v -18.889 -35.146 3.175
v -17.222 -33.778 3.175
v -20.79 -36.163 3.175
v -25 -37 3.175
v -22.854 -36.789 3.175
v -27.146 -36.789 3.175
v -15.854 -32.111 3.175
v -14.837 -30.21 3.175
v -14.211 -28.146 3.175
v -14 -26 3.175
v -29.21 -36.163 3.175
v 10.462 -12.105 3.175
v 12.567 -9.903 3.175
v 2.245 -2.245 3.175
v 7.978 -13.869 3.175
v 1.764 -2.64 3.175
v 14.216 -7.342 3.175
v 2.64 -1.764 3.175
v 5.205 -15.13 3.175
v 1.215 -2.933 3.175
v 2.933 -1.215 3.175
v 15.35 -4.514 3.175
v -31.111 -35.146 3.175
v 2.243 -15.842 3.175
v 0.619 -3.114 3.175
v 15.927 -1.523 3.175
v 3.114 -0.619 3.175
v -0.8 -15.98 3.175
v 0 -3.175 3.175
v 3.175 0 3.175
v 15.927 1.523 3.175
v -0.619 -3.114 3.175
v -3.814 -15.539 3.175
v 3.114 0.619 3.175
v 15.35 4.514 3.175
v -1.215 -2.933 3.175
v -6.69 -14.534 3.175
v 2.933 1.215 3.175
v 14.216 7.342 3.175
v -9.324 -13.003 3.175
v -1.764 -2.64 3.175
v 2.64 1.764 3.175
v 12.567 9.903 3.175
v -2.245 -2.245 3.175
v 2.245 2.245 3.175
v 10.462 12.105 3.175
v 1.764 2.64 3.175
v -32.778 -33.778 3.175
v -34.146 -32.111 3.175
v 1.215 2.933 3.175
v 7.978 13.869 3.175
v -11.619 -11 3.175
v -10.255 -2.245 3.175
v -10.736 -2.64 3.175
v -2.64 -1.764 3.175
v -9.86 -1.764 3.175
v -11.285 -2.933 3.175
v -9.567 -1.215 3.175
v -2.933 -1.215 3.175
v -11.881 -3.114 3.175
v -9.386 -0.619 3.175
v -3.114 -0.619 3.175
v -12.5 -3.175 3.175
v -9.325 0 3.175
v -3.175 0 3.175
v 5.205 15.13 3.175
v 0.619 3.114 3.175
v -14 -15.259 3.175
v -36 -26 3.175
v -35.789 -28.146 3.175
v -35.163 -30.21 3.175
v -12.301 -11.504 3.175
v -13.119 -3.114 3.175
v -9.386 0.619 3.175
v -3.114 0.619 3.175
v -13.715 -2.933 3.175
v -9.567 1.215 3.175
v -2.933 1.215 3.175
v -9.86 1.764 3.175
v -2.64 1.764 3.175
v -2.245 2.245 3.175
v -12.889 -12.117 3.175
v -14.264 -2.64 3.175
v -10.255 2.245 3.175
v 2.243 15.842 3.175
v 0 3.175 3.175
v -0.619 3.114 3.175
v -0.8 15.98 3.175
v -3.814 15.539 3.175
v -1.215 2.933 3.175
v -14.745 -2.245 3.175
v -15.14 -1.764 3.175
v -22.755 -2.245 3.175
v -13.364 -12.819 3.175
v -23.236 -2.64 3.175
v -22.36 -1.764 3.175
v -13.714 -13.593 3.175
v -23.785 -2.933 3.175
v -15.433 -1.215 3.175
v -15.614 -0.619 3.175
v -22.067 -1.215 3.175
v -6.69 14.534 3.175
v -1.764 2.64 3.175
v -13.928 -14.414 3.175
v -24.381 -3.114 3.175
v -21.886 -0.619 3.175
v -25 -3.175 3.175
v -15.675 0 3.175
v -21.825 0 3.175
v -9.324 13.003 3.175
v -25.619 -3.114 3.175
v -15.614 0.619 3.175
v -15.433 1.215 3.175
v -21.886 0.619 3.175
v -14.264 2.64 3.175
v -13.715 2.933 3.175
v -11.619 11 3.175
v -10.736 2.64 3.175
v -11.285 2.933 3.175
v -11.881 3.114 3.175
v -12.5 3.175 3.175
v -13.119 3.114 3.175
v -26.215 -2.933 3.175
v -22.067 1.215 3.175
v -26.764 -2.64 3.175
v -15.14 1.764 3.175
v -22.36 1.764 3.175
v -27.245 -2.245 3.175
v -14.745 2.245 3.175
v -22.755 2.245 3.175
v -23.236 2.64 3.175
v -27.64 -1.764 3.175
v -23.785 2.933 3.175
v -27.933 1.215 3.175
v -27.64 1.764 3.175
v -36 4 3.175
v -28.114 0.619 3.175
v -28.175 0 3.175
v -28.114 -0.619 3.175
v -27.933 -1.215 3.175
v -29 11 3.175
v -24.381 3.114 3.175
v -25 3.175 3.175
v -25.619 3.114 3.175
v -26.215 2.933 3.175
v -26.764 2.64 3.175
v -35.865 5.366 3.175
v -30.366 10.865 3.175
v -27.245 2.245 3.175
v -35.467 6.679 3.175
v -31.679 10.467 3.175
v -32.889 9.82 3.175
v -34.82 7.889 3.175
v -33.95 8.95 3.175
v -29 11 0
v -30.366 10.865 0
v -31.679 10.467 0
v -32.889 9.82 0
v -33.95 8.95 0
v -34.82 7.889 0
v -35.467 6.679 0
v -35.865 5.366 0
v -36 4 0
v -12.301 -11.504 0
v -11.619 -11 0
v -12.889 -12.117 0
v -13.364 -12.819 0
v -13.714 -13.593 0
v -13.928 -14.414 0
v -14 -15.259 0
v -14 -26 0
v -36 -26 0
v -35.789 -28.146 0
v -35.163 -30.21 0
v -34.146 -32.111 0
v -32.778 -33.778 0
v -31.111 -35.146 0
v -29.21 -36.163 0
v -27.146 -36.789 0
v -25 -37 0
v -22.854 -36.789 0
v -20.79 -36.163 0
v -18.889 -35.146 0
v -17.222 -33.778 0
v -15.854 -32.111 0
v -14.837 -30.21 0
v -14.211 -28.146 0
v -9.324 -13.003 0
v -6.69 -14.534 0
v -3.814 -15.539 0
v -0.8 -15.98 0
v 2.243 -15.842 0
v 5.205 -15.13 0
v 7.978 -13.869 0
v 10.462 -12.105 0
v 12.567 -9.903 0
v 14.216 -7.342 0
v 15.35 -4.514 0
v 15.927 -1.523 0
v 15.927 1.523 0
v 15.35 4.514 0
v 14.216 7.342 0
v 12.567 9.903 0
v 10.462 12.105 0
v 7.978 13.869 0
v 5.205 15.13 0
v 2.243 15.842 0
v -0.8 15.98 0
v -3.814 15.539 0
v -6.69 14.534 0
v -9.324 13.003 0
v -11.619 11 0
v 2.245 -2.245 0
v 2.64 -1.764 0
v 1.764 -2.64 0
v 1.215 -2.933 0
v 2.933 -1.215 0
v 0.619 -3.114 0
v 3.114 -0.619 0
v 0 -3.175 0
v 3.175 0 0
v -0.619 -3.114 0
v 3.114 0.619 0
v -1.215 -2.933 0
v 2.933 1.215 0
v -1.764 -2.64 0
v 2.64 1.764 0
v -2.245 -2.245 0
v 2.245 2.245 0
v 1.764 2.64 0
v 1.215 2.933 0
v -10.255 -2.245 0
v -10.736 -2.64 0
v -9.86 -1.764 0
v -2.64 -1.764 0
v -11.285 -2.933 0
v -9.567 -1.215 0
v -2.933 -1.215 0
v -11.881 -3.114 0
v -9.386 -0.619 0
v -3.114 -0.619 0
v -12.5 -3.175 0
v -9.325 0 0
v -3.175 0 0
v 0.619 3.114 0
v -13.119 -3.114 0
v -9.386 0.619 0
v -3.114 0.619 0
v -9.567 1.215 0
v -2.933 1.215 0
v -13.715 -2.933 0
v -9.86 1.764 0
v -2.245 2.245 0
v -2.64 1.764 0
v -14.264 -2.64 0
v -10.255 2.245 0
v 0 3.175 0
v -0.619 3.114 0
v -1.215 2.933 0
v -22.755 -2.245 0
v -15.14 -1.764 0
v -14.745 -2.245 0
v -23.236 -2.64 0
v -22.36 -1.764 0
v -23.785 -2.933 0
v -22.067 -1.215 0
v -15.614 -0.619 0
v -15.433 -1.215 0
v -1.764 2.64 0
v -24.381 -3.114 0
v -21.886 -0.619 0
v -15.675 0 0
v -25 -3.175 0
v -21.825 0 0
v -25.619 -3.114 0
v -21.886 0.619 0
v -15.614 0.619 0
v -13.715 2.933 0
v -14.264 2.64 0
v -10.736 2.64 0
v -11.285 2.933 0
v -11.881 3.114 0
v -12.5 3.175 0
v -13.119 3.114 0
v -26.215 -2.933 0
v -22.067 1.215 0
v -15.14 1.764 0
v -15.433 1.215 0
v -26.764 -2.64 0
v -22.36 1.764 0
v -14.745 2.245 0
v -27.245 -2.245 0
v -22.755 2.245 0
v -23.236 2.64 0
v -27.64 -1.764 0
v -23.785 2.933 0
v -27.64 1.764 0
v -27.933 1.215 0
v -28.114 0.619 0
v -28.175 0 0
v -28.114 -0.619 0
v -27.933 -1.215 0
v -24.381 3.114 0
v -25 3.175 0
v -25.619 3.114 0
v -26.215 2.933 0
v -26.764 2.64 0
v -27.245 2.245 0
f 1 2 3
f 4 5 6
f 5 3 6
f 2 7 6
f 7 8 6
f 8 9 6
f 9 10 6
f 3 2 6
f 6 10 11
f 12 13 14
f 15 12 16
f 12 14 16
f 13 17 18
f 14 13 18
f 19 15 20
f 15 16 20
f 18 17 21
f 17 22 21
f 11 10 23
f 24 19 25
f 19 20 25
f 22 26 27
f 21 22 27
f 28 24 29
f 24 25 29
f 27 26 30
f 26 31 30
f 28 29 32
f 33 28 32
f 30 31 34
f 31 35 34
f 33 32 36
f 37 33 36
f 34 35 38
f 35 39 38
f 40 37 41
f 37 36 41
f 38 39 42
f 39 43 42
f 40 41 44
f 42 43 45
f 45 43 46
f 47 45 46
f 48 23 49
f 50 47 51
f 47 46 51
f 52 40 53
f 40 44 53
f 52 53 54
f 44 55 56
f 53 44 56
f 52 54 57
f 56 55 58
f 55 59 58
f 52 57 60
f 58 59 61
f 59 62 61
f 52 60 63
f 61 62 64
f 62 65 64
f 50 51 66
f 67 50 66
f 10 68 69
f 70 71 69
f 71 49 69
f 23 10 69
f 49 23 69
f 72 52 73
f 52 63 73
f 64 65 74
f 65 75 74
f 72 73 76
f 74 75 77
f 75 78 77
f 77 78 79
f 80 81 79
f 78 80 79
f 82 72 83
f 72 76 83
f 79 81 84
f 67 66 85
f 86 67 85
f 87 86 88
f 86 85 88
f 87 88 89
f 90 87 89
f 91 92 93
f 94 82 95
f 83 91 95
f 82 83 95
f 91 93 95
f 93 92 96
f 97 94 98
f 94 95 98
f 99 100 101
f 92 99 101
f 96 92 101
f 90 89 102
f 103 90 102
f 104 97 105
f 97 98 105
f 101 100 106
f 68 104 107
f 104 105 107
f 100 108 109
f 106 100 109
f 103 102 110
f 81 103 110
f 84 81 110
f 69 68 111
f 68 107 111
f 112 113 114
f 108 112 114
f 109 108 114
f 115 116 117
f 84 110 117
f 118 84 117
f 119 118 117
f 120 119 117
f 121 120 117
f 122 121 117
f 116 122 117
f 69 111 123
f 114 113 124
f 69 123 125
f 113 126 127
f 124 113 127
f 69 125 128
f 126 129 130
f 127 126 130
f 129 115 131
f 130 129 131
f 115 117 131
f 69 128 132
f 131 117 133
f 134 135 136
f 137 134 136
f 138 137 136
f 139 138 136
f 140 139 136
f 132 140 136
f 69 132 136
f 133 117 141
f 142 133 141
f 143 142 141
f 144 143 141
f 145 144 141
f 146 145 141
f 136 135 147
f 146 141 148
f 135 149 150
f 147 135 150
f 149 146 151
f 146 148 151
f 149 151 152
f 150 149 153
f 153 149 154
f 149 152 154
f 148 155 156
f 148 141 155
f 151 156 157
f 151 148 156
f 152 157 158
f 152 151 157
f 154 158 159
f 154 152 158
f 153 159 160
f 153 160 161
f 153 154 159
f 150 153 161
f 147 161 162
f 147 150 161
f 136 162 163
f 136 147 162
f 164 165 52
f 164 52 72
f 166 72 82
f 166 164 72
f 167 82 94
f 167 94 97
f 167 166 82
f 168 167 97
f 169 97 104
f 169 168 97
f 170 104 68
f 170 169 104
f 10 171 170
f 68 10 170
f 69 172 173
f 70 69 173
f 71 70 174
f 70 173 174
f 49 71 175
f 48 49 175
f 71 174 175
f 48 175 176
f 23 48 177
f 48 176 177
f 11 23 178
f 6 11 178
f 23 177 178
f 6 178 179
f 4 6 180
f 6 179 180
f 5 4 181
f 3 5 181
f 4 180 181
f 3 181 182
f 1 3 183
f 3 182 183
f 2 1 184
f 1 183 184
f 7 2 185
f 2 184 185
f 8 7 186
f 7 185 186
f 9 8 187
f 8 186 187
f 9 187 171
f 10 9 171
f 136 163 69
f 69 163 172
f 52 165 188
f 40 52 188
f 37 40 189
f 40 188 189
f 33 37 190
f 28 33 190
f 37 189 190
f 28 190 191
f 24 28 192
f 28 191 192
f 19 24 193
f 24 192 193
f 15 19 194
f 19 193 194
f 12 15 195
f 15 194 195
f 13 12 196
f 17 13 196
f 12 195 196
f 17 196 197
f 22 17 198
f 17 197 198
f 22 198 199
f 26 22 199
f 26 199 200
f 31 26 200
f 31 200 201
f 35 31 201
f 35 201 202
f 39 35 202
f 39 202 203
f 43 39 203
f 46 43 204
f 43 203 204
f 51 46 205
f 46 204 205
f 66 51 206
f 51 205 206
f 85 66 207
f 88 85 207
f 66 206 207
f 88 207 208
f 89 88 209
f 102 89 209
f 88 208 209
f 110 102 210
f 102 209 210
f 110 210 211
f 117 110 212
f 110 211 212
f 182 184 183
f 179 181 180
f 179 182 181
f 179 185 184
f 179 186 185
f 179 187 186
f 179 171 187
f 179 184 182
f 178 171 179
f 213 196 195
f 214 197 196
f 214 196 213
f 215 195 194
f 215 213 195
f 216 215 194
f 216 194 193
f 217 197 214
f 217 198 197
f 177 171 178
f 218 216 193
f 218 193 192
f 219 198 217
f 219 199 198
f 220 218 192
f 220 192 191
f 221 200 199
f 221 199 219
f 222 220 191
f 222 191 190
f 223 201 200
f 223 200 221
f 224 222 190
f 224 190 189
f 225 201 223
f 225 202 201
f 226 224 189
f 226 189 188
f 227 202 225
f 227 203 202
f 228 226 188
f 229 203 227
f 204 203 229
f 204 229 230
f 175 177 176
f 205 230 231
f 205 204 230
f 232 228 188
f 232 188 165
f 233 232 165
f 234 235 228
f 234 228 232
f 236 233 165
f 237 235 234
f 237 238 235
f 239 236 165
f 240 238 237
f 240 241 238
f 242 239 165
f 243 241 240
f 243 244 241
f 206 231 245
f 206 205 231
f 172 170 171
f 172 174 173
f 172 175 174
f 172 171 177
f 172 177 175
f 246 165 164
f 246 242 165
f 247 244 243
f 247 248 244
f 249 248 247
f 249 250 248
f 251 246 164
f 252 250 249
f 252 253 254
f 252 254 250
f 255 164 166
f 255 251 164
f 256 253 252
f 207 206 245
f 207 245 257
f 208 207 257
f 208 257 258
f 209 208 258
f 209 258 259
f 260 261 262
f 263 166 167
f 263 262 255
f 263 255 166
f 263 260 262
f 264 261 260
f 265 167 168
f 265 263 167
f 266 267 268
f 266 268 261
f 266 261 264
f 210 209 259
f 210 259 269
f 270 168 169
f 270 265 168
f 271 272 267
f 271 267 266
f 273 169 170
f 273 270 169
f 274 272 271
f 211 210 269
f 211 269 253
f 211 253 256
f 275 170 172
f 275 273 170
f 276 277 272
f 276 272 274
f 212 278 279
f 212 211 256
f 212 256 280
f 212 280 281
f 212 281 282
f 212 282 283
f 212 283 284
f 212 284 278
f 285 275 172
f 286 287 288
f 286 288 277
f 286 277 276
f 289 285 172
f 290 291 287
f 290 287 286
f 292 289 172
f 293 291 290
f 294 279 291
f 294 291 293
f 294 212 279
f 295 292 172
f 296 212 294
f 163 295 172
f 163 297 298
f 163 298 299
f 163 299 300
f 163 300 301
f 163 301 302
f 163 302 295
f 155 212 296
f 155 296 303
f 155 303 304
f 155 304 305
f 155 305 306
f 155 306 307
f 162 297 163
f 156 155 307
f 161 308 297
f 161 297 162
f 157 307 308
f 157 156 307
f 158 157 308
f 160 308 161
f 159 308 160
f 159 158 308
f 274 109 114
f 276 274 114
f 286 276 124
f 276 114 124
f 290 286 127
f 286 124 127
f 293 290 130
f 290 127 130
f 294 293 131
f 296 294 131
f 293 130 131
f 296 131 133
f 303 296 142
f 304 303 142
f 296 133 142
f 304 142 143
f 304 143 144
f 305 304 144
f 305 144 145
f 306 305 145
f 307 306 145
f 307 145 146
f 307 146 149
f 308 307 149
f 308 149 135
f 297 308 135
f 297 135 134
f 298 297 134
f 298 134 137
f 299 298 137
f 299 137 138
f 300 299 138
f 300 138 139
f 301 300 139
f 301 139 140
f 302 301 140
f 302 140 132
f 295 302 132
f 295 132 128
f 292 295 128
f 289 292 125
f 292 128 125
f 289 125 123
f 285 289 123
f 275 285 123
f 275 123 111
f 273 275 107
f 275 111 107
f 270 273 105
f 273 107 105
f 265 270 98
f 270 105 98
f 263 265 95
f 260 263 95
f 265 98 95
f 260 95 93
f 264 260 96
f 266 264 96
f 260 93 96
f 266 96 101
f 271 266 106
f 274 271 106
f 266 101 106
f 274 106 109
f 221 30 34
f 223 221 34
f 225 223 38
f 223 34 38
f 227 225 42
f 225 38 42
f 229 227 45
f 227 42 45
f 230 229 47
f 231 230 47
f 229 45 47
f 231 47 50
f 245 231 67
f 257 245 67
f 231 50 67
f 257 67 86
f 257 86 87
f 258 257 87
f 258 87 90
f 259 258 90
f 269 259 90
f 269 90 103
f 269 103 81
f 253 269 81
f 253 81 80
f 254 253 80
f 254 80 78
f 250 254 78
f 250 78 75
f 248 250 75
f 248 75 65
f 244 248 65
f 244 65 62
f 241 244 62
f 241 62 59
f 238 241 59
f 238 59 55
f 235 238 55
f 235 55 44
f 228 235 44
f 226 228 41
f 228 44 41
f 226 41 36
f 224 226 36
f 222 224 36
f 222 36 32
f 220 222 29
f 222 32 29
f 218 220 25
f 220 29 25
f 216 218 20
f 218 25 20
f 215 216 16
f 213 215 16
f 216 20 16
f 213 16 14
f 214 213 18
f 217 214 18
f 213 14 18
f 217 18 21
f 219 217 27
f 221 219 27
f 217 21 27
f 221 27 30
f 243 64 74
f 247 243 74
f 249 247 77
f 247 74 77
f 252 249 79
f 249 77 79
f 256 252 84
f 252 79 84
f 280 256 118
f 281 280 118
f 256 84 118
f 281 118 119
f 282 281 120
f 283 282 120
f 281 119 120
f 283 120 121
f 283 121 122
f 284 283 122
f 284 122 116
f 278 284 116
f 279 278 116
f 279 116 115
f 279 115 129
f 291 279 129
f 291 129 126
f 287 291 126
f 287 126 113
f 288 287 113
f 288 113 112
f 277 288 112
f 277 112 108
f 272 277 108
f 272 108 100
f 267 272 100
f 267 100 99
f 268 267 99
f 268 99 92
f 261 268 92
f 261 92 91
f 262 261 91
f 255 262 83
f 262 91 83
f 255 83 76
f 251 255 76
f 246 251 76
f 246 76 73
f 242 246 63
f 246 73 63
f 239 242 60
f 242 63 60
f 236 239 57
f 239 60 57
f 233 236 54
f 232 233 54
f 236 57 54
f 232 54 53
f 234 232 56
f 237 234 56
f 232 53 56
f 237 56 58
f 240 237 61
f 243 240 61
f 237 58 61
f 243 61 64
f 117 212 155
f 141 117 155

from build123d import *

# Parameters (mm, degrees)
BOSS_EXTRUDE1_DEPTH = 3.175
FILLET1_R           = 7
FILLET2_R           = 5
SKETCH2_R           = 3.175
CUT_EXTRUDE1_DEPTH  = 52.721181589
LPATTERN1_COUNT     = 3
LPATTERN1_PITCH     = 12.5


with BuildPart() as part:
    # Sketch1 → Boss-Extrude1 (new body)
    with BuildSketch(Plane.XY):
        with BuildLine():
            Line((-11.618950039, 11), (-36, 11))
            Line((-36, 11), (-36, -26))
            ThreePointArc((-36, -26), (-25, -37), (-14, -26))
            Line((-14, -26), (-14, -11))
            Line((-14, -11), (-11.618950039, -11))
            ThreePointArc((-11.618950039, -11), (16, 0), (-11.618950039, 11))
        make_face()
    extrude(amount=BOSS_EXTRUDE1_DEPTH)

    # Fillet1
    fillet1_edges = [part.edges().sort_by_distance(p)[0] for p in [
        (-36, 11, 1.5875),
    ]]
    fillet(fillet1_edges, radius=FILLET1_R)

    # Fillet2
    # the kernel refuses this fillet: 5 mm, written as the material it adds along each edge
    with BuildSketch(Plane(origin=(-14, -11, 0), x_dir=(1, 0, 0), z_dir=(0, 0, 1))) as fillet2_piece_1:
        with BuildLine():
            CenterArc((5, -4.259237102), FILLET2_R, 121.586822832, 58.413177168)
            Line((0, -4.259237102), (-0.1, -4.259237102))
            Line((-0.1, -4.259237102), (-0.1, 0))
            Line((-0.1, 0), (0, 0.1))
            ThreePointArc((0, 0.1), (1.190524981, 0.1), (2.328670961, 0.085184742))
            Line((2.328670961, 0.085184742), (2.381049961, 0))
        make_face()
    extrude(amount=3.175)

    # Sketch2 → Cut-Extrude1 (cut, through all)
    with BuildSketch(Plane.XY.offset(3.175)):
        Circle(SKETCH2_R)
    cut_extrude1 = extrude(amount=-CUT_EXTRUDE1_DEPTH, mode=Mode.SUBTRACT)

    # LPattern1: Cut-Extrude1 ×3
    with Locations(*[(-i * LPATTERN1_PITCH, 0, 0) for i in range(1, LPATTERN1_COUNT)]):
        add(cut_extrude1, mode=Mode.SUBTRACT)


solid = part.part
